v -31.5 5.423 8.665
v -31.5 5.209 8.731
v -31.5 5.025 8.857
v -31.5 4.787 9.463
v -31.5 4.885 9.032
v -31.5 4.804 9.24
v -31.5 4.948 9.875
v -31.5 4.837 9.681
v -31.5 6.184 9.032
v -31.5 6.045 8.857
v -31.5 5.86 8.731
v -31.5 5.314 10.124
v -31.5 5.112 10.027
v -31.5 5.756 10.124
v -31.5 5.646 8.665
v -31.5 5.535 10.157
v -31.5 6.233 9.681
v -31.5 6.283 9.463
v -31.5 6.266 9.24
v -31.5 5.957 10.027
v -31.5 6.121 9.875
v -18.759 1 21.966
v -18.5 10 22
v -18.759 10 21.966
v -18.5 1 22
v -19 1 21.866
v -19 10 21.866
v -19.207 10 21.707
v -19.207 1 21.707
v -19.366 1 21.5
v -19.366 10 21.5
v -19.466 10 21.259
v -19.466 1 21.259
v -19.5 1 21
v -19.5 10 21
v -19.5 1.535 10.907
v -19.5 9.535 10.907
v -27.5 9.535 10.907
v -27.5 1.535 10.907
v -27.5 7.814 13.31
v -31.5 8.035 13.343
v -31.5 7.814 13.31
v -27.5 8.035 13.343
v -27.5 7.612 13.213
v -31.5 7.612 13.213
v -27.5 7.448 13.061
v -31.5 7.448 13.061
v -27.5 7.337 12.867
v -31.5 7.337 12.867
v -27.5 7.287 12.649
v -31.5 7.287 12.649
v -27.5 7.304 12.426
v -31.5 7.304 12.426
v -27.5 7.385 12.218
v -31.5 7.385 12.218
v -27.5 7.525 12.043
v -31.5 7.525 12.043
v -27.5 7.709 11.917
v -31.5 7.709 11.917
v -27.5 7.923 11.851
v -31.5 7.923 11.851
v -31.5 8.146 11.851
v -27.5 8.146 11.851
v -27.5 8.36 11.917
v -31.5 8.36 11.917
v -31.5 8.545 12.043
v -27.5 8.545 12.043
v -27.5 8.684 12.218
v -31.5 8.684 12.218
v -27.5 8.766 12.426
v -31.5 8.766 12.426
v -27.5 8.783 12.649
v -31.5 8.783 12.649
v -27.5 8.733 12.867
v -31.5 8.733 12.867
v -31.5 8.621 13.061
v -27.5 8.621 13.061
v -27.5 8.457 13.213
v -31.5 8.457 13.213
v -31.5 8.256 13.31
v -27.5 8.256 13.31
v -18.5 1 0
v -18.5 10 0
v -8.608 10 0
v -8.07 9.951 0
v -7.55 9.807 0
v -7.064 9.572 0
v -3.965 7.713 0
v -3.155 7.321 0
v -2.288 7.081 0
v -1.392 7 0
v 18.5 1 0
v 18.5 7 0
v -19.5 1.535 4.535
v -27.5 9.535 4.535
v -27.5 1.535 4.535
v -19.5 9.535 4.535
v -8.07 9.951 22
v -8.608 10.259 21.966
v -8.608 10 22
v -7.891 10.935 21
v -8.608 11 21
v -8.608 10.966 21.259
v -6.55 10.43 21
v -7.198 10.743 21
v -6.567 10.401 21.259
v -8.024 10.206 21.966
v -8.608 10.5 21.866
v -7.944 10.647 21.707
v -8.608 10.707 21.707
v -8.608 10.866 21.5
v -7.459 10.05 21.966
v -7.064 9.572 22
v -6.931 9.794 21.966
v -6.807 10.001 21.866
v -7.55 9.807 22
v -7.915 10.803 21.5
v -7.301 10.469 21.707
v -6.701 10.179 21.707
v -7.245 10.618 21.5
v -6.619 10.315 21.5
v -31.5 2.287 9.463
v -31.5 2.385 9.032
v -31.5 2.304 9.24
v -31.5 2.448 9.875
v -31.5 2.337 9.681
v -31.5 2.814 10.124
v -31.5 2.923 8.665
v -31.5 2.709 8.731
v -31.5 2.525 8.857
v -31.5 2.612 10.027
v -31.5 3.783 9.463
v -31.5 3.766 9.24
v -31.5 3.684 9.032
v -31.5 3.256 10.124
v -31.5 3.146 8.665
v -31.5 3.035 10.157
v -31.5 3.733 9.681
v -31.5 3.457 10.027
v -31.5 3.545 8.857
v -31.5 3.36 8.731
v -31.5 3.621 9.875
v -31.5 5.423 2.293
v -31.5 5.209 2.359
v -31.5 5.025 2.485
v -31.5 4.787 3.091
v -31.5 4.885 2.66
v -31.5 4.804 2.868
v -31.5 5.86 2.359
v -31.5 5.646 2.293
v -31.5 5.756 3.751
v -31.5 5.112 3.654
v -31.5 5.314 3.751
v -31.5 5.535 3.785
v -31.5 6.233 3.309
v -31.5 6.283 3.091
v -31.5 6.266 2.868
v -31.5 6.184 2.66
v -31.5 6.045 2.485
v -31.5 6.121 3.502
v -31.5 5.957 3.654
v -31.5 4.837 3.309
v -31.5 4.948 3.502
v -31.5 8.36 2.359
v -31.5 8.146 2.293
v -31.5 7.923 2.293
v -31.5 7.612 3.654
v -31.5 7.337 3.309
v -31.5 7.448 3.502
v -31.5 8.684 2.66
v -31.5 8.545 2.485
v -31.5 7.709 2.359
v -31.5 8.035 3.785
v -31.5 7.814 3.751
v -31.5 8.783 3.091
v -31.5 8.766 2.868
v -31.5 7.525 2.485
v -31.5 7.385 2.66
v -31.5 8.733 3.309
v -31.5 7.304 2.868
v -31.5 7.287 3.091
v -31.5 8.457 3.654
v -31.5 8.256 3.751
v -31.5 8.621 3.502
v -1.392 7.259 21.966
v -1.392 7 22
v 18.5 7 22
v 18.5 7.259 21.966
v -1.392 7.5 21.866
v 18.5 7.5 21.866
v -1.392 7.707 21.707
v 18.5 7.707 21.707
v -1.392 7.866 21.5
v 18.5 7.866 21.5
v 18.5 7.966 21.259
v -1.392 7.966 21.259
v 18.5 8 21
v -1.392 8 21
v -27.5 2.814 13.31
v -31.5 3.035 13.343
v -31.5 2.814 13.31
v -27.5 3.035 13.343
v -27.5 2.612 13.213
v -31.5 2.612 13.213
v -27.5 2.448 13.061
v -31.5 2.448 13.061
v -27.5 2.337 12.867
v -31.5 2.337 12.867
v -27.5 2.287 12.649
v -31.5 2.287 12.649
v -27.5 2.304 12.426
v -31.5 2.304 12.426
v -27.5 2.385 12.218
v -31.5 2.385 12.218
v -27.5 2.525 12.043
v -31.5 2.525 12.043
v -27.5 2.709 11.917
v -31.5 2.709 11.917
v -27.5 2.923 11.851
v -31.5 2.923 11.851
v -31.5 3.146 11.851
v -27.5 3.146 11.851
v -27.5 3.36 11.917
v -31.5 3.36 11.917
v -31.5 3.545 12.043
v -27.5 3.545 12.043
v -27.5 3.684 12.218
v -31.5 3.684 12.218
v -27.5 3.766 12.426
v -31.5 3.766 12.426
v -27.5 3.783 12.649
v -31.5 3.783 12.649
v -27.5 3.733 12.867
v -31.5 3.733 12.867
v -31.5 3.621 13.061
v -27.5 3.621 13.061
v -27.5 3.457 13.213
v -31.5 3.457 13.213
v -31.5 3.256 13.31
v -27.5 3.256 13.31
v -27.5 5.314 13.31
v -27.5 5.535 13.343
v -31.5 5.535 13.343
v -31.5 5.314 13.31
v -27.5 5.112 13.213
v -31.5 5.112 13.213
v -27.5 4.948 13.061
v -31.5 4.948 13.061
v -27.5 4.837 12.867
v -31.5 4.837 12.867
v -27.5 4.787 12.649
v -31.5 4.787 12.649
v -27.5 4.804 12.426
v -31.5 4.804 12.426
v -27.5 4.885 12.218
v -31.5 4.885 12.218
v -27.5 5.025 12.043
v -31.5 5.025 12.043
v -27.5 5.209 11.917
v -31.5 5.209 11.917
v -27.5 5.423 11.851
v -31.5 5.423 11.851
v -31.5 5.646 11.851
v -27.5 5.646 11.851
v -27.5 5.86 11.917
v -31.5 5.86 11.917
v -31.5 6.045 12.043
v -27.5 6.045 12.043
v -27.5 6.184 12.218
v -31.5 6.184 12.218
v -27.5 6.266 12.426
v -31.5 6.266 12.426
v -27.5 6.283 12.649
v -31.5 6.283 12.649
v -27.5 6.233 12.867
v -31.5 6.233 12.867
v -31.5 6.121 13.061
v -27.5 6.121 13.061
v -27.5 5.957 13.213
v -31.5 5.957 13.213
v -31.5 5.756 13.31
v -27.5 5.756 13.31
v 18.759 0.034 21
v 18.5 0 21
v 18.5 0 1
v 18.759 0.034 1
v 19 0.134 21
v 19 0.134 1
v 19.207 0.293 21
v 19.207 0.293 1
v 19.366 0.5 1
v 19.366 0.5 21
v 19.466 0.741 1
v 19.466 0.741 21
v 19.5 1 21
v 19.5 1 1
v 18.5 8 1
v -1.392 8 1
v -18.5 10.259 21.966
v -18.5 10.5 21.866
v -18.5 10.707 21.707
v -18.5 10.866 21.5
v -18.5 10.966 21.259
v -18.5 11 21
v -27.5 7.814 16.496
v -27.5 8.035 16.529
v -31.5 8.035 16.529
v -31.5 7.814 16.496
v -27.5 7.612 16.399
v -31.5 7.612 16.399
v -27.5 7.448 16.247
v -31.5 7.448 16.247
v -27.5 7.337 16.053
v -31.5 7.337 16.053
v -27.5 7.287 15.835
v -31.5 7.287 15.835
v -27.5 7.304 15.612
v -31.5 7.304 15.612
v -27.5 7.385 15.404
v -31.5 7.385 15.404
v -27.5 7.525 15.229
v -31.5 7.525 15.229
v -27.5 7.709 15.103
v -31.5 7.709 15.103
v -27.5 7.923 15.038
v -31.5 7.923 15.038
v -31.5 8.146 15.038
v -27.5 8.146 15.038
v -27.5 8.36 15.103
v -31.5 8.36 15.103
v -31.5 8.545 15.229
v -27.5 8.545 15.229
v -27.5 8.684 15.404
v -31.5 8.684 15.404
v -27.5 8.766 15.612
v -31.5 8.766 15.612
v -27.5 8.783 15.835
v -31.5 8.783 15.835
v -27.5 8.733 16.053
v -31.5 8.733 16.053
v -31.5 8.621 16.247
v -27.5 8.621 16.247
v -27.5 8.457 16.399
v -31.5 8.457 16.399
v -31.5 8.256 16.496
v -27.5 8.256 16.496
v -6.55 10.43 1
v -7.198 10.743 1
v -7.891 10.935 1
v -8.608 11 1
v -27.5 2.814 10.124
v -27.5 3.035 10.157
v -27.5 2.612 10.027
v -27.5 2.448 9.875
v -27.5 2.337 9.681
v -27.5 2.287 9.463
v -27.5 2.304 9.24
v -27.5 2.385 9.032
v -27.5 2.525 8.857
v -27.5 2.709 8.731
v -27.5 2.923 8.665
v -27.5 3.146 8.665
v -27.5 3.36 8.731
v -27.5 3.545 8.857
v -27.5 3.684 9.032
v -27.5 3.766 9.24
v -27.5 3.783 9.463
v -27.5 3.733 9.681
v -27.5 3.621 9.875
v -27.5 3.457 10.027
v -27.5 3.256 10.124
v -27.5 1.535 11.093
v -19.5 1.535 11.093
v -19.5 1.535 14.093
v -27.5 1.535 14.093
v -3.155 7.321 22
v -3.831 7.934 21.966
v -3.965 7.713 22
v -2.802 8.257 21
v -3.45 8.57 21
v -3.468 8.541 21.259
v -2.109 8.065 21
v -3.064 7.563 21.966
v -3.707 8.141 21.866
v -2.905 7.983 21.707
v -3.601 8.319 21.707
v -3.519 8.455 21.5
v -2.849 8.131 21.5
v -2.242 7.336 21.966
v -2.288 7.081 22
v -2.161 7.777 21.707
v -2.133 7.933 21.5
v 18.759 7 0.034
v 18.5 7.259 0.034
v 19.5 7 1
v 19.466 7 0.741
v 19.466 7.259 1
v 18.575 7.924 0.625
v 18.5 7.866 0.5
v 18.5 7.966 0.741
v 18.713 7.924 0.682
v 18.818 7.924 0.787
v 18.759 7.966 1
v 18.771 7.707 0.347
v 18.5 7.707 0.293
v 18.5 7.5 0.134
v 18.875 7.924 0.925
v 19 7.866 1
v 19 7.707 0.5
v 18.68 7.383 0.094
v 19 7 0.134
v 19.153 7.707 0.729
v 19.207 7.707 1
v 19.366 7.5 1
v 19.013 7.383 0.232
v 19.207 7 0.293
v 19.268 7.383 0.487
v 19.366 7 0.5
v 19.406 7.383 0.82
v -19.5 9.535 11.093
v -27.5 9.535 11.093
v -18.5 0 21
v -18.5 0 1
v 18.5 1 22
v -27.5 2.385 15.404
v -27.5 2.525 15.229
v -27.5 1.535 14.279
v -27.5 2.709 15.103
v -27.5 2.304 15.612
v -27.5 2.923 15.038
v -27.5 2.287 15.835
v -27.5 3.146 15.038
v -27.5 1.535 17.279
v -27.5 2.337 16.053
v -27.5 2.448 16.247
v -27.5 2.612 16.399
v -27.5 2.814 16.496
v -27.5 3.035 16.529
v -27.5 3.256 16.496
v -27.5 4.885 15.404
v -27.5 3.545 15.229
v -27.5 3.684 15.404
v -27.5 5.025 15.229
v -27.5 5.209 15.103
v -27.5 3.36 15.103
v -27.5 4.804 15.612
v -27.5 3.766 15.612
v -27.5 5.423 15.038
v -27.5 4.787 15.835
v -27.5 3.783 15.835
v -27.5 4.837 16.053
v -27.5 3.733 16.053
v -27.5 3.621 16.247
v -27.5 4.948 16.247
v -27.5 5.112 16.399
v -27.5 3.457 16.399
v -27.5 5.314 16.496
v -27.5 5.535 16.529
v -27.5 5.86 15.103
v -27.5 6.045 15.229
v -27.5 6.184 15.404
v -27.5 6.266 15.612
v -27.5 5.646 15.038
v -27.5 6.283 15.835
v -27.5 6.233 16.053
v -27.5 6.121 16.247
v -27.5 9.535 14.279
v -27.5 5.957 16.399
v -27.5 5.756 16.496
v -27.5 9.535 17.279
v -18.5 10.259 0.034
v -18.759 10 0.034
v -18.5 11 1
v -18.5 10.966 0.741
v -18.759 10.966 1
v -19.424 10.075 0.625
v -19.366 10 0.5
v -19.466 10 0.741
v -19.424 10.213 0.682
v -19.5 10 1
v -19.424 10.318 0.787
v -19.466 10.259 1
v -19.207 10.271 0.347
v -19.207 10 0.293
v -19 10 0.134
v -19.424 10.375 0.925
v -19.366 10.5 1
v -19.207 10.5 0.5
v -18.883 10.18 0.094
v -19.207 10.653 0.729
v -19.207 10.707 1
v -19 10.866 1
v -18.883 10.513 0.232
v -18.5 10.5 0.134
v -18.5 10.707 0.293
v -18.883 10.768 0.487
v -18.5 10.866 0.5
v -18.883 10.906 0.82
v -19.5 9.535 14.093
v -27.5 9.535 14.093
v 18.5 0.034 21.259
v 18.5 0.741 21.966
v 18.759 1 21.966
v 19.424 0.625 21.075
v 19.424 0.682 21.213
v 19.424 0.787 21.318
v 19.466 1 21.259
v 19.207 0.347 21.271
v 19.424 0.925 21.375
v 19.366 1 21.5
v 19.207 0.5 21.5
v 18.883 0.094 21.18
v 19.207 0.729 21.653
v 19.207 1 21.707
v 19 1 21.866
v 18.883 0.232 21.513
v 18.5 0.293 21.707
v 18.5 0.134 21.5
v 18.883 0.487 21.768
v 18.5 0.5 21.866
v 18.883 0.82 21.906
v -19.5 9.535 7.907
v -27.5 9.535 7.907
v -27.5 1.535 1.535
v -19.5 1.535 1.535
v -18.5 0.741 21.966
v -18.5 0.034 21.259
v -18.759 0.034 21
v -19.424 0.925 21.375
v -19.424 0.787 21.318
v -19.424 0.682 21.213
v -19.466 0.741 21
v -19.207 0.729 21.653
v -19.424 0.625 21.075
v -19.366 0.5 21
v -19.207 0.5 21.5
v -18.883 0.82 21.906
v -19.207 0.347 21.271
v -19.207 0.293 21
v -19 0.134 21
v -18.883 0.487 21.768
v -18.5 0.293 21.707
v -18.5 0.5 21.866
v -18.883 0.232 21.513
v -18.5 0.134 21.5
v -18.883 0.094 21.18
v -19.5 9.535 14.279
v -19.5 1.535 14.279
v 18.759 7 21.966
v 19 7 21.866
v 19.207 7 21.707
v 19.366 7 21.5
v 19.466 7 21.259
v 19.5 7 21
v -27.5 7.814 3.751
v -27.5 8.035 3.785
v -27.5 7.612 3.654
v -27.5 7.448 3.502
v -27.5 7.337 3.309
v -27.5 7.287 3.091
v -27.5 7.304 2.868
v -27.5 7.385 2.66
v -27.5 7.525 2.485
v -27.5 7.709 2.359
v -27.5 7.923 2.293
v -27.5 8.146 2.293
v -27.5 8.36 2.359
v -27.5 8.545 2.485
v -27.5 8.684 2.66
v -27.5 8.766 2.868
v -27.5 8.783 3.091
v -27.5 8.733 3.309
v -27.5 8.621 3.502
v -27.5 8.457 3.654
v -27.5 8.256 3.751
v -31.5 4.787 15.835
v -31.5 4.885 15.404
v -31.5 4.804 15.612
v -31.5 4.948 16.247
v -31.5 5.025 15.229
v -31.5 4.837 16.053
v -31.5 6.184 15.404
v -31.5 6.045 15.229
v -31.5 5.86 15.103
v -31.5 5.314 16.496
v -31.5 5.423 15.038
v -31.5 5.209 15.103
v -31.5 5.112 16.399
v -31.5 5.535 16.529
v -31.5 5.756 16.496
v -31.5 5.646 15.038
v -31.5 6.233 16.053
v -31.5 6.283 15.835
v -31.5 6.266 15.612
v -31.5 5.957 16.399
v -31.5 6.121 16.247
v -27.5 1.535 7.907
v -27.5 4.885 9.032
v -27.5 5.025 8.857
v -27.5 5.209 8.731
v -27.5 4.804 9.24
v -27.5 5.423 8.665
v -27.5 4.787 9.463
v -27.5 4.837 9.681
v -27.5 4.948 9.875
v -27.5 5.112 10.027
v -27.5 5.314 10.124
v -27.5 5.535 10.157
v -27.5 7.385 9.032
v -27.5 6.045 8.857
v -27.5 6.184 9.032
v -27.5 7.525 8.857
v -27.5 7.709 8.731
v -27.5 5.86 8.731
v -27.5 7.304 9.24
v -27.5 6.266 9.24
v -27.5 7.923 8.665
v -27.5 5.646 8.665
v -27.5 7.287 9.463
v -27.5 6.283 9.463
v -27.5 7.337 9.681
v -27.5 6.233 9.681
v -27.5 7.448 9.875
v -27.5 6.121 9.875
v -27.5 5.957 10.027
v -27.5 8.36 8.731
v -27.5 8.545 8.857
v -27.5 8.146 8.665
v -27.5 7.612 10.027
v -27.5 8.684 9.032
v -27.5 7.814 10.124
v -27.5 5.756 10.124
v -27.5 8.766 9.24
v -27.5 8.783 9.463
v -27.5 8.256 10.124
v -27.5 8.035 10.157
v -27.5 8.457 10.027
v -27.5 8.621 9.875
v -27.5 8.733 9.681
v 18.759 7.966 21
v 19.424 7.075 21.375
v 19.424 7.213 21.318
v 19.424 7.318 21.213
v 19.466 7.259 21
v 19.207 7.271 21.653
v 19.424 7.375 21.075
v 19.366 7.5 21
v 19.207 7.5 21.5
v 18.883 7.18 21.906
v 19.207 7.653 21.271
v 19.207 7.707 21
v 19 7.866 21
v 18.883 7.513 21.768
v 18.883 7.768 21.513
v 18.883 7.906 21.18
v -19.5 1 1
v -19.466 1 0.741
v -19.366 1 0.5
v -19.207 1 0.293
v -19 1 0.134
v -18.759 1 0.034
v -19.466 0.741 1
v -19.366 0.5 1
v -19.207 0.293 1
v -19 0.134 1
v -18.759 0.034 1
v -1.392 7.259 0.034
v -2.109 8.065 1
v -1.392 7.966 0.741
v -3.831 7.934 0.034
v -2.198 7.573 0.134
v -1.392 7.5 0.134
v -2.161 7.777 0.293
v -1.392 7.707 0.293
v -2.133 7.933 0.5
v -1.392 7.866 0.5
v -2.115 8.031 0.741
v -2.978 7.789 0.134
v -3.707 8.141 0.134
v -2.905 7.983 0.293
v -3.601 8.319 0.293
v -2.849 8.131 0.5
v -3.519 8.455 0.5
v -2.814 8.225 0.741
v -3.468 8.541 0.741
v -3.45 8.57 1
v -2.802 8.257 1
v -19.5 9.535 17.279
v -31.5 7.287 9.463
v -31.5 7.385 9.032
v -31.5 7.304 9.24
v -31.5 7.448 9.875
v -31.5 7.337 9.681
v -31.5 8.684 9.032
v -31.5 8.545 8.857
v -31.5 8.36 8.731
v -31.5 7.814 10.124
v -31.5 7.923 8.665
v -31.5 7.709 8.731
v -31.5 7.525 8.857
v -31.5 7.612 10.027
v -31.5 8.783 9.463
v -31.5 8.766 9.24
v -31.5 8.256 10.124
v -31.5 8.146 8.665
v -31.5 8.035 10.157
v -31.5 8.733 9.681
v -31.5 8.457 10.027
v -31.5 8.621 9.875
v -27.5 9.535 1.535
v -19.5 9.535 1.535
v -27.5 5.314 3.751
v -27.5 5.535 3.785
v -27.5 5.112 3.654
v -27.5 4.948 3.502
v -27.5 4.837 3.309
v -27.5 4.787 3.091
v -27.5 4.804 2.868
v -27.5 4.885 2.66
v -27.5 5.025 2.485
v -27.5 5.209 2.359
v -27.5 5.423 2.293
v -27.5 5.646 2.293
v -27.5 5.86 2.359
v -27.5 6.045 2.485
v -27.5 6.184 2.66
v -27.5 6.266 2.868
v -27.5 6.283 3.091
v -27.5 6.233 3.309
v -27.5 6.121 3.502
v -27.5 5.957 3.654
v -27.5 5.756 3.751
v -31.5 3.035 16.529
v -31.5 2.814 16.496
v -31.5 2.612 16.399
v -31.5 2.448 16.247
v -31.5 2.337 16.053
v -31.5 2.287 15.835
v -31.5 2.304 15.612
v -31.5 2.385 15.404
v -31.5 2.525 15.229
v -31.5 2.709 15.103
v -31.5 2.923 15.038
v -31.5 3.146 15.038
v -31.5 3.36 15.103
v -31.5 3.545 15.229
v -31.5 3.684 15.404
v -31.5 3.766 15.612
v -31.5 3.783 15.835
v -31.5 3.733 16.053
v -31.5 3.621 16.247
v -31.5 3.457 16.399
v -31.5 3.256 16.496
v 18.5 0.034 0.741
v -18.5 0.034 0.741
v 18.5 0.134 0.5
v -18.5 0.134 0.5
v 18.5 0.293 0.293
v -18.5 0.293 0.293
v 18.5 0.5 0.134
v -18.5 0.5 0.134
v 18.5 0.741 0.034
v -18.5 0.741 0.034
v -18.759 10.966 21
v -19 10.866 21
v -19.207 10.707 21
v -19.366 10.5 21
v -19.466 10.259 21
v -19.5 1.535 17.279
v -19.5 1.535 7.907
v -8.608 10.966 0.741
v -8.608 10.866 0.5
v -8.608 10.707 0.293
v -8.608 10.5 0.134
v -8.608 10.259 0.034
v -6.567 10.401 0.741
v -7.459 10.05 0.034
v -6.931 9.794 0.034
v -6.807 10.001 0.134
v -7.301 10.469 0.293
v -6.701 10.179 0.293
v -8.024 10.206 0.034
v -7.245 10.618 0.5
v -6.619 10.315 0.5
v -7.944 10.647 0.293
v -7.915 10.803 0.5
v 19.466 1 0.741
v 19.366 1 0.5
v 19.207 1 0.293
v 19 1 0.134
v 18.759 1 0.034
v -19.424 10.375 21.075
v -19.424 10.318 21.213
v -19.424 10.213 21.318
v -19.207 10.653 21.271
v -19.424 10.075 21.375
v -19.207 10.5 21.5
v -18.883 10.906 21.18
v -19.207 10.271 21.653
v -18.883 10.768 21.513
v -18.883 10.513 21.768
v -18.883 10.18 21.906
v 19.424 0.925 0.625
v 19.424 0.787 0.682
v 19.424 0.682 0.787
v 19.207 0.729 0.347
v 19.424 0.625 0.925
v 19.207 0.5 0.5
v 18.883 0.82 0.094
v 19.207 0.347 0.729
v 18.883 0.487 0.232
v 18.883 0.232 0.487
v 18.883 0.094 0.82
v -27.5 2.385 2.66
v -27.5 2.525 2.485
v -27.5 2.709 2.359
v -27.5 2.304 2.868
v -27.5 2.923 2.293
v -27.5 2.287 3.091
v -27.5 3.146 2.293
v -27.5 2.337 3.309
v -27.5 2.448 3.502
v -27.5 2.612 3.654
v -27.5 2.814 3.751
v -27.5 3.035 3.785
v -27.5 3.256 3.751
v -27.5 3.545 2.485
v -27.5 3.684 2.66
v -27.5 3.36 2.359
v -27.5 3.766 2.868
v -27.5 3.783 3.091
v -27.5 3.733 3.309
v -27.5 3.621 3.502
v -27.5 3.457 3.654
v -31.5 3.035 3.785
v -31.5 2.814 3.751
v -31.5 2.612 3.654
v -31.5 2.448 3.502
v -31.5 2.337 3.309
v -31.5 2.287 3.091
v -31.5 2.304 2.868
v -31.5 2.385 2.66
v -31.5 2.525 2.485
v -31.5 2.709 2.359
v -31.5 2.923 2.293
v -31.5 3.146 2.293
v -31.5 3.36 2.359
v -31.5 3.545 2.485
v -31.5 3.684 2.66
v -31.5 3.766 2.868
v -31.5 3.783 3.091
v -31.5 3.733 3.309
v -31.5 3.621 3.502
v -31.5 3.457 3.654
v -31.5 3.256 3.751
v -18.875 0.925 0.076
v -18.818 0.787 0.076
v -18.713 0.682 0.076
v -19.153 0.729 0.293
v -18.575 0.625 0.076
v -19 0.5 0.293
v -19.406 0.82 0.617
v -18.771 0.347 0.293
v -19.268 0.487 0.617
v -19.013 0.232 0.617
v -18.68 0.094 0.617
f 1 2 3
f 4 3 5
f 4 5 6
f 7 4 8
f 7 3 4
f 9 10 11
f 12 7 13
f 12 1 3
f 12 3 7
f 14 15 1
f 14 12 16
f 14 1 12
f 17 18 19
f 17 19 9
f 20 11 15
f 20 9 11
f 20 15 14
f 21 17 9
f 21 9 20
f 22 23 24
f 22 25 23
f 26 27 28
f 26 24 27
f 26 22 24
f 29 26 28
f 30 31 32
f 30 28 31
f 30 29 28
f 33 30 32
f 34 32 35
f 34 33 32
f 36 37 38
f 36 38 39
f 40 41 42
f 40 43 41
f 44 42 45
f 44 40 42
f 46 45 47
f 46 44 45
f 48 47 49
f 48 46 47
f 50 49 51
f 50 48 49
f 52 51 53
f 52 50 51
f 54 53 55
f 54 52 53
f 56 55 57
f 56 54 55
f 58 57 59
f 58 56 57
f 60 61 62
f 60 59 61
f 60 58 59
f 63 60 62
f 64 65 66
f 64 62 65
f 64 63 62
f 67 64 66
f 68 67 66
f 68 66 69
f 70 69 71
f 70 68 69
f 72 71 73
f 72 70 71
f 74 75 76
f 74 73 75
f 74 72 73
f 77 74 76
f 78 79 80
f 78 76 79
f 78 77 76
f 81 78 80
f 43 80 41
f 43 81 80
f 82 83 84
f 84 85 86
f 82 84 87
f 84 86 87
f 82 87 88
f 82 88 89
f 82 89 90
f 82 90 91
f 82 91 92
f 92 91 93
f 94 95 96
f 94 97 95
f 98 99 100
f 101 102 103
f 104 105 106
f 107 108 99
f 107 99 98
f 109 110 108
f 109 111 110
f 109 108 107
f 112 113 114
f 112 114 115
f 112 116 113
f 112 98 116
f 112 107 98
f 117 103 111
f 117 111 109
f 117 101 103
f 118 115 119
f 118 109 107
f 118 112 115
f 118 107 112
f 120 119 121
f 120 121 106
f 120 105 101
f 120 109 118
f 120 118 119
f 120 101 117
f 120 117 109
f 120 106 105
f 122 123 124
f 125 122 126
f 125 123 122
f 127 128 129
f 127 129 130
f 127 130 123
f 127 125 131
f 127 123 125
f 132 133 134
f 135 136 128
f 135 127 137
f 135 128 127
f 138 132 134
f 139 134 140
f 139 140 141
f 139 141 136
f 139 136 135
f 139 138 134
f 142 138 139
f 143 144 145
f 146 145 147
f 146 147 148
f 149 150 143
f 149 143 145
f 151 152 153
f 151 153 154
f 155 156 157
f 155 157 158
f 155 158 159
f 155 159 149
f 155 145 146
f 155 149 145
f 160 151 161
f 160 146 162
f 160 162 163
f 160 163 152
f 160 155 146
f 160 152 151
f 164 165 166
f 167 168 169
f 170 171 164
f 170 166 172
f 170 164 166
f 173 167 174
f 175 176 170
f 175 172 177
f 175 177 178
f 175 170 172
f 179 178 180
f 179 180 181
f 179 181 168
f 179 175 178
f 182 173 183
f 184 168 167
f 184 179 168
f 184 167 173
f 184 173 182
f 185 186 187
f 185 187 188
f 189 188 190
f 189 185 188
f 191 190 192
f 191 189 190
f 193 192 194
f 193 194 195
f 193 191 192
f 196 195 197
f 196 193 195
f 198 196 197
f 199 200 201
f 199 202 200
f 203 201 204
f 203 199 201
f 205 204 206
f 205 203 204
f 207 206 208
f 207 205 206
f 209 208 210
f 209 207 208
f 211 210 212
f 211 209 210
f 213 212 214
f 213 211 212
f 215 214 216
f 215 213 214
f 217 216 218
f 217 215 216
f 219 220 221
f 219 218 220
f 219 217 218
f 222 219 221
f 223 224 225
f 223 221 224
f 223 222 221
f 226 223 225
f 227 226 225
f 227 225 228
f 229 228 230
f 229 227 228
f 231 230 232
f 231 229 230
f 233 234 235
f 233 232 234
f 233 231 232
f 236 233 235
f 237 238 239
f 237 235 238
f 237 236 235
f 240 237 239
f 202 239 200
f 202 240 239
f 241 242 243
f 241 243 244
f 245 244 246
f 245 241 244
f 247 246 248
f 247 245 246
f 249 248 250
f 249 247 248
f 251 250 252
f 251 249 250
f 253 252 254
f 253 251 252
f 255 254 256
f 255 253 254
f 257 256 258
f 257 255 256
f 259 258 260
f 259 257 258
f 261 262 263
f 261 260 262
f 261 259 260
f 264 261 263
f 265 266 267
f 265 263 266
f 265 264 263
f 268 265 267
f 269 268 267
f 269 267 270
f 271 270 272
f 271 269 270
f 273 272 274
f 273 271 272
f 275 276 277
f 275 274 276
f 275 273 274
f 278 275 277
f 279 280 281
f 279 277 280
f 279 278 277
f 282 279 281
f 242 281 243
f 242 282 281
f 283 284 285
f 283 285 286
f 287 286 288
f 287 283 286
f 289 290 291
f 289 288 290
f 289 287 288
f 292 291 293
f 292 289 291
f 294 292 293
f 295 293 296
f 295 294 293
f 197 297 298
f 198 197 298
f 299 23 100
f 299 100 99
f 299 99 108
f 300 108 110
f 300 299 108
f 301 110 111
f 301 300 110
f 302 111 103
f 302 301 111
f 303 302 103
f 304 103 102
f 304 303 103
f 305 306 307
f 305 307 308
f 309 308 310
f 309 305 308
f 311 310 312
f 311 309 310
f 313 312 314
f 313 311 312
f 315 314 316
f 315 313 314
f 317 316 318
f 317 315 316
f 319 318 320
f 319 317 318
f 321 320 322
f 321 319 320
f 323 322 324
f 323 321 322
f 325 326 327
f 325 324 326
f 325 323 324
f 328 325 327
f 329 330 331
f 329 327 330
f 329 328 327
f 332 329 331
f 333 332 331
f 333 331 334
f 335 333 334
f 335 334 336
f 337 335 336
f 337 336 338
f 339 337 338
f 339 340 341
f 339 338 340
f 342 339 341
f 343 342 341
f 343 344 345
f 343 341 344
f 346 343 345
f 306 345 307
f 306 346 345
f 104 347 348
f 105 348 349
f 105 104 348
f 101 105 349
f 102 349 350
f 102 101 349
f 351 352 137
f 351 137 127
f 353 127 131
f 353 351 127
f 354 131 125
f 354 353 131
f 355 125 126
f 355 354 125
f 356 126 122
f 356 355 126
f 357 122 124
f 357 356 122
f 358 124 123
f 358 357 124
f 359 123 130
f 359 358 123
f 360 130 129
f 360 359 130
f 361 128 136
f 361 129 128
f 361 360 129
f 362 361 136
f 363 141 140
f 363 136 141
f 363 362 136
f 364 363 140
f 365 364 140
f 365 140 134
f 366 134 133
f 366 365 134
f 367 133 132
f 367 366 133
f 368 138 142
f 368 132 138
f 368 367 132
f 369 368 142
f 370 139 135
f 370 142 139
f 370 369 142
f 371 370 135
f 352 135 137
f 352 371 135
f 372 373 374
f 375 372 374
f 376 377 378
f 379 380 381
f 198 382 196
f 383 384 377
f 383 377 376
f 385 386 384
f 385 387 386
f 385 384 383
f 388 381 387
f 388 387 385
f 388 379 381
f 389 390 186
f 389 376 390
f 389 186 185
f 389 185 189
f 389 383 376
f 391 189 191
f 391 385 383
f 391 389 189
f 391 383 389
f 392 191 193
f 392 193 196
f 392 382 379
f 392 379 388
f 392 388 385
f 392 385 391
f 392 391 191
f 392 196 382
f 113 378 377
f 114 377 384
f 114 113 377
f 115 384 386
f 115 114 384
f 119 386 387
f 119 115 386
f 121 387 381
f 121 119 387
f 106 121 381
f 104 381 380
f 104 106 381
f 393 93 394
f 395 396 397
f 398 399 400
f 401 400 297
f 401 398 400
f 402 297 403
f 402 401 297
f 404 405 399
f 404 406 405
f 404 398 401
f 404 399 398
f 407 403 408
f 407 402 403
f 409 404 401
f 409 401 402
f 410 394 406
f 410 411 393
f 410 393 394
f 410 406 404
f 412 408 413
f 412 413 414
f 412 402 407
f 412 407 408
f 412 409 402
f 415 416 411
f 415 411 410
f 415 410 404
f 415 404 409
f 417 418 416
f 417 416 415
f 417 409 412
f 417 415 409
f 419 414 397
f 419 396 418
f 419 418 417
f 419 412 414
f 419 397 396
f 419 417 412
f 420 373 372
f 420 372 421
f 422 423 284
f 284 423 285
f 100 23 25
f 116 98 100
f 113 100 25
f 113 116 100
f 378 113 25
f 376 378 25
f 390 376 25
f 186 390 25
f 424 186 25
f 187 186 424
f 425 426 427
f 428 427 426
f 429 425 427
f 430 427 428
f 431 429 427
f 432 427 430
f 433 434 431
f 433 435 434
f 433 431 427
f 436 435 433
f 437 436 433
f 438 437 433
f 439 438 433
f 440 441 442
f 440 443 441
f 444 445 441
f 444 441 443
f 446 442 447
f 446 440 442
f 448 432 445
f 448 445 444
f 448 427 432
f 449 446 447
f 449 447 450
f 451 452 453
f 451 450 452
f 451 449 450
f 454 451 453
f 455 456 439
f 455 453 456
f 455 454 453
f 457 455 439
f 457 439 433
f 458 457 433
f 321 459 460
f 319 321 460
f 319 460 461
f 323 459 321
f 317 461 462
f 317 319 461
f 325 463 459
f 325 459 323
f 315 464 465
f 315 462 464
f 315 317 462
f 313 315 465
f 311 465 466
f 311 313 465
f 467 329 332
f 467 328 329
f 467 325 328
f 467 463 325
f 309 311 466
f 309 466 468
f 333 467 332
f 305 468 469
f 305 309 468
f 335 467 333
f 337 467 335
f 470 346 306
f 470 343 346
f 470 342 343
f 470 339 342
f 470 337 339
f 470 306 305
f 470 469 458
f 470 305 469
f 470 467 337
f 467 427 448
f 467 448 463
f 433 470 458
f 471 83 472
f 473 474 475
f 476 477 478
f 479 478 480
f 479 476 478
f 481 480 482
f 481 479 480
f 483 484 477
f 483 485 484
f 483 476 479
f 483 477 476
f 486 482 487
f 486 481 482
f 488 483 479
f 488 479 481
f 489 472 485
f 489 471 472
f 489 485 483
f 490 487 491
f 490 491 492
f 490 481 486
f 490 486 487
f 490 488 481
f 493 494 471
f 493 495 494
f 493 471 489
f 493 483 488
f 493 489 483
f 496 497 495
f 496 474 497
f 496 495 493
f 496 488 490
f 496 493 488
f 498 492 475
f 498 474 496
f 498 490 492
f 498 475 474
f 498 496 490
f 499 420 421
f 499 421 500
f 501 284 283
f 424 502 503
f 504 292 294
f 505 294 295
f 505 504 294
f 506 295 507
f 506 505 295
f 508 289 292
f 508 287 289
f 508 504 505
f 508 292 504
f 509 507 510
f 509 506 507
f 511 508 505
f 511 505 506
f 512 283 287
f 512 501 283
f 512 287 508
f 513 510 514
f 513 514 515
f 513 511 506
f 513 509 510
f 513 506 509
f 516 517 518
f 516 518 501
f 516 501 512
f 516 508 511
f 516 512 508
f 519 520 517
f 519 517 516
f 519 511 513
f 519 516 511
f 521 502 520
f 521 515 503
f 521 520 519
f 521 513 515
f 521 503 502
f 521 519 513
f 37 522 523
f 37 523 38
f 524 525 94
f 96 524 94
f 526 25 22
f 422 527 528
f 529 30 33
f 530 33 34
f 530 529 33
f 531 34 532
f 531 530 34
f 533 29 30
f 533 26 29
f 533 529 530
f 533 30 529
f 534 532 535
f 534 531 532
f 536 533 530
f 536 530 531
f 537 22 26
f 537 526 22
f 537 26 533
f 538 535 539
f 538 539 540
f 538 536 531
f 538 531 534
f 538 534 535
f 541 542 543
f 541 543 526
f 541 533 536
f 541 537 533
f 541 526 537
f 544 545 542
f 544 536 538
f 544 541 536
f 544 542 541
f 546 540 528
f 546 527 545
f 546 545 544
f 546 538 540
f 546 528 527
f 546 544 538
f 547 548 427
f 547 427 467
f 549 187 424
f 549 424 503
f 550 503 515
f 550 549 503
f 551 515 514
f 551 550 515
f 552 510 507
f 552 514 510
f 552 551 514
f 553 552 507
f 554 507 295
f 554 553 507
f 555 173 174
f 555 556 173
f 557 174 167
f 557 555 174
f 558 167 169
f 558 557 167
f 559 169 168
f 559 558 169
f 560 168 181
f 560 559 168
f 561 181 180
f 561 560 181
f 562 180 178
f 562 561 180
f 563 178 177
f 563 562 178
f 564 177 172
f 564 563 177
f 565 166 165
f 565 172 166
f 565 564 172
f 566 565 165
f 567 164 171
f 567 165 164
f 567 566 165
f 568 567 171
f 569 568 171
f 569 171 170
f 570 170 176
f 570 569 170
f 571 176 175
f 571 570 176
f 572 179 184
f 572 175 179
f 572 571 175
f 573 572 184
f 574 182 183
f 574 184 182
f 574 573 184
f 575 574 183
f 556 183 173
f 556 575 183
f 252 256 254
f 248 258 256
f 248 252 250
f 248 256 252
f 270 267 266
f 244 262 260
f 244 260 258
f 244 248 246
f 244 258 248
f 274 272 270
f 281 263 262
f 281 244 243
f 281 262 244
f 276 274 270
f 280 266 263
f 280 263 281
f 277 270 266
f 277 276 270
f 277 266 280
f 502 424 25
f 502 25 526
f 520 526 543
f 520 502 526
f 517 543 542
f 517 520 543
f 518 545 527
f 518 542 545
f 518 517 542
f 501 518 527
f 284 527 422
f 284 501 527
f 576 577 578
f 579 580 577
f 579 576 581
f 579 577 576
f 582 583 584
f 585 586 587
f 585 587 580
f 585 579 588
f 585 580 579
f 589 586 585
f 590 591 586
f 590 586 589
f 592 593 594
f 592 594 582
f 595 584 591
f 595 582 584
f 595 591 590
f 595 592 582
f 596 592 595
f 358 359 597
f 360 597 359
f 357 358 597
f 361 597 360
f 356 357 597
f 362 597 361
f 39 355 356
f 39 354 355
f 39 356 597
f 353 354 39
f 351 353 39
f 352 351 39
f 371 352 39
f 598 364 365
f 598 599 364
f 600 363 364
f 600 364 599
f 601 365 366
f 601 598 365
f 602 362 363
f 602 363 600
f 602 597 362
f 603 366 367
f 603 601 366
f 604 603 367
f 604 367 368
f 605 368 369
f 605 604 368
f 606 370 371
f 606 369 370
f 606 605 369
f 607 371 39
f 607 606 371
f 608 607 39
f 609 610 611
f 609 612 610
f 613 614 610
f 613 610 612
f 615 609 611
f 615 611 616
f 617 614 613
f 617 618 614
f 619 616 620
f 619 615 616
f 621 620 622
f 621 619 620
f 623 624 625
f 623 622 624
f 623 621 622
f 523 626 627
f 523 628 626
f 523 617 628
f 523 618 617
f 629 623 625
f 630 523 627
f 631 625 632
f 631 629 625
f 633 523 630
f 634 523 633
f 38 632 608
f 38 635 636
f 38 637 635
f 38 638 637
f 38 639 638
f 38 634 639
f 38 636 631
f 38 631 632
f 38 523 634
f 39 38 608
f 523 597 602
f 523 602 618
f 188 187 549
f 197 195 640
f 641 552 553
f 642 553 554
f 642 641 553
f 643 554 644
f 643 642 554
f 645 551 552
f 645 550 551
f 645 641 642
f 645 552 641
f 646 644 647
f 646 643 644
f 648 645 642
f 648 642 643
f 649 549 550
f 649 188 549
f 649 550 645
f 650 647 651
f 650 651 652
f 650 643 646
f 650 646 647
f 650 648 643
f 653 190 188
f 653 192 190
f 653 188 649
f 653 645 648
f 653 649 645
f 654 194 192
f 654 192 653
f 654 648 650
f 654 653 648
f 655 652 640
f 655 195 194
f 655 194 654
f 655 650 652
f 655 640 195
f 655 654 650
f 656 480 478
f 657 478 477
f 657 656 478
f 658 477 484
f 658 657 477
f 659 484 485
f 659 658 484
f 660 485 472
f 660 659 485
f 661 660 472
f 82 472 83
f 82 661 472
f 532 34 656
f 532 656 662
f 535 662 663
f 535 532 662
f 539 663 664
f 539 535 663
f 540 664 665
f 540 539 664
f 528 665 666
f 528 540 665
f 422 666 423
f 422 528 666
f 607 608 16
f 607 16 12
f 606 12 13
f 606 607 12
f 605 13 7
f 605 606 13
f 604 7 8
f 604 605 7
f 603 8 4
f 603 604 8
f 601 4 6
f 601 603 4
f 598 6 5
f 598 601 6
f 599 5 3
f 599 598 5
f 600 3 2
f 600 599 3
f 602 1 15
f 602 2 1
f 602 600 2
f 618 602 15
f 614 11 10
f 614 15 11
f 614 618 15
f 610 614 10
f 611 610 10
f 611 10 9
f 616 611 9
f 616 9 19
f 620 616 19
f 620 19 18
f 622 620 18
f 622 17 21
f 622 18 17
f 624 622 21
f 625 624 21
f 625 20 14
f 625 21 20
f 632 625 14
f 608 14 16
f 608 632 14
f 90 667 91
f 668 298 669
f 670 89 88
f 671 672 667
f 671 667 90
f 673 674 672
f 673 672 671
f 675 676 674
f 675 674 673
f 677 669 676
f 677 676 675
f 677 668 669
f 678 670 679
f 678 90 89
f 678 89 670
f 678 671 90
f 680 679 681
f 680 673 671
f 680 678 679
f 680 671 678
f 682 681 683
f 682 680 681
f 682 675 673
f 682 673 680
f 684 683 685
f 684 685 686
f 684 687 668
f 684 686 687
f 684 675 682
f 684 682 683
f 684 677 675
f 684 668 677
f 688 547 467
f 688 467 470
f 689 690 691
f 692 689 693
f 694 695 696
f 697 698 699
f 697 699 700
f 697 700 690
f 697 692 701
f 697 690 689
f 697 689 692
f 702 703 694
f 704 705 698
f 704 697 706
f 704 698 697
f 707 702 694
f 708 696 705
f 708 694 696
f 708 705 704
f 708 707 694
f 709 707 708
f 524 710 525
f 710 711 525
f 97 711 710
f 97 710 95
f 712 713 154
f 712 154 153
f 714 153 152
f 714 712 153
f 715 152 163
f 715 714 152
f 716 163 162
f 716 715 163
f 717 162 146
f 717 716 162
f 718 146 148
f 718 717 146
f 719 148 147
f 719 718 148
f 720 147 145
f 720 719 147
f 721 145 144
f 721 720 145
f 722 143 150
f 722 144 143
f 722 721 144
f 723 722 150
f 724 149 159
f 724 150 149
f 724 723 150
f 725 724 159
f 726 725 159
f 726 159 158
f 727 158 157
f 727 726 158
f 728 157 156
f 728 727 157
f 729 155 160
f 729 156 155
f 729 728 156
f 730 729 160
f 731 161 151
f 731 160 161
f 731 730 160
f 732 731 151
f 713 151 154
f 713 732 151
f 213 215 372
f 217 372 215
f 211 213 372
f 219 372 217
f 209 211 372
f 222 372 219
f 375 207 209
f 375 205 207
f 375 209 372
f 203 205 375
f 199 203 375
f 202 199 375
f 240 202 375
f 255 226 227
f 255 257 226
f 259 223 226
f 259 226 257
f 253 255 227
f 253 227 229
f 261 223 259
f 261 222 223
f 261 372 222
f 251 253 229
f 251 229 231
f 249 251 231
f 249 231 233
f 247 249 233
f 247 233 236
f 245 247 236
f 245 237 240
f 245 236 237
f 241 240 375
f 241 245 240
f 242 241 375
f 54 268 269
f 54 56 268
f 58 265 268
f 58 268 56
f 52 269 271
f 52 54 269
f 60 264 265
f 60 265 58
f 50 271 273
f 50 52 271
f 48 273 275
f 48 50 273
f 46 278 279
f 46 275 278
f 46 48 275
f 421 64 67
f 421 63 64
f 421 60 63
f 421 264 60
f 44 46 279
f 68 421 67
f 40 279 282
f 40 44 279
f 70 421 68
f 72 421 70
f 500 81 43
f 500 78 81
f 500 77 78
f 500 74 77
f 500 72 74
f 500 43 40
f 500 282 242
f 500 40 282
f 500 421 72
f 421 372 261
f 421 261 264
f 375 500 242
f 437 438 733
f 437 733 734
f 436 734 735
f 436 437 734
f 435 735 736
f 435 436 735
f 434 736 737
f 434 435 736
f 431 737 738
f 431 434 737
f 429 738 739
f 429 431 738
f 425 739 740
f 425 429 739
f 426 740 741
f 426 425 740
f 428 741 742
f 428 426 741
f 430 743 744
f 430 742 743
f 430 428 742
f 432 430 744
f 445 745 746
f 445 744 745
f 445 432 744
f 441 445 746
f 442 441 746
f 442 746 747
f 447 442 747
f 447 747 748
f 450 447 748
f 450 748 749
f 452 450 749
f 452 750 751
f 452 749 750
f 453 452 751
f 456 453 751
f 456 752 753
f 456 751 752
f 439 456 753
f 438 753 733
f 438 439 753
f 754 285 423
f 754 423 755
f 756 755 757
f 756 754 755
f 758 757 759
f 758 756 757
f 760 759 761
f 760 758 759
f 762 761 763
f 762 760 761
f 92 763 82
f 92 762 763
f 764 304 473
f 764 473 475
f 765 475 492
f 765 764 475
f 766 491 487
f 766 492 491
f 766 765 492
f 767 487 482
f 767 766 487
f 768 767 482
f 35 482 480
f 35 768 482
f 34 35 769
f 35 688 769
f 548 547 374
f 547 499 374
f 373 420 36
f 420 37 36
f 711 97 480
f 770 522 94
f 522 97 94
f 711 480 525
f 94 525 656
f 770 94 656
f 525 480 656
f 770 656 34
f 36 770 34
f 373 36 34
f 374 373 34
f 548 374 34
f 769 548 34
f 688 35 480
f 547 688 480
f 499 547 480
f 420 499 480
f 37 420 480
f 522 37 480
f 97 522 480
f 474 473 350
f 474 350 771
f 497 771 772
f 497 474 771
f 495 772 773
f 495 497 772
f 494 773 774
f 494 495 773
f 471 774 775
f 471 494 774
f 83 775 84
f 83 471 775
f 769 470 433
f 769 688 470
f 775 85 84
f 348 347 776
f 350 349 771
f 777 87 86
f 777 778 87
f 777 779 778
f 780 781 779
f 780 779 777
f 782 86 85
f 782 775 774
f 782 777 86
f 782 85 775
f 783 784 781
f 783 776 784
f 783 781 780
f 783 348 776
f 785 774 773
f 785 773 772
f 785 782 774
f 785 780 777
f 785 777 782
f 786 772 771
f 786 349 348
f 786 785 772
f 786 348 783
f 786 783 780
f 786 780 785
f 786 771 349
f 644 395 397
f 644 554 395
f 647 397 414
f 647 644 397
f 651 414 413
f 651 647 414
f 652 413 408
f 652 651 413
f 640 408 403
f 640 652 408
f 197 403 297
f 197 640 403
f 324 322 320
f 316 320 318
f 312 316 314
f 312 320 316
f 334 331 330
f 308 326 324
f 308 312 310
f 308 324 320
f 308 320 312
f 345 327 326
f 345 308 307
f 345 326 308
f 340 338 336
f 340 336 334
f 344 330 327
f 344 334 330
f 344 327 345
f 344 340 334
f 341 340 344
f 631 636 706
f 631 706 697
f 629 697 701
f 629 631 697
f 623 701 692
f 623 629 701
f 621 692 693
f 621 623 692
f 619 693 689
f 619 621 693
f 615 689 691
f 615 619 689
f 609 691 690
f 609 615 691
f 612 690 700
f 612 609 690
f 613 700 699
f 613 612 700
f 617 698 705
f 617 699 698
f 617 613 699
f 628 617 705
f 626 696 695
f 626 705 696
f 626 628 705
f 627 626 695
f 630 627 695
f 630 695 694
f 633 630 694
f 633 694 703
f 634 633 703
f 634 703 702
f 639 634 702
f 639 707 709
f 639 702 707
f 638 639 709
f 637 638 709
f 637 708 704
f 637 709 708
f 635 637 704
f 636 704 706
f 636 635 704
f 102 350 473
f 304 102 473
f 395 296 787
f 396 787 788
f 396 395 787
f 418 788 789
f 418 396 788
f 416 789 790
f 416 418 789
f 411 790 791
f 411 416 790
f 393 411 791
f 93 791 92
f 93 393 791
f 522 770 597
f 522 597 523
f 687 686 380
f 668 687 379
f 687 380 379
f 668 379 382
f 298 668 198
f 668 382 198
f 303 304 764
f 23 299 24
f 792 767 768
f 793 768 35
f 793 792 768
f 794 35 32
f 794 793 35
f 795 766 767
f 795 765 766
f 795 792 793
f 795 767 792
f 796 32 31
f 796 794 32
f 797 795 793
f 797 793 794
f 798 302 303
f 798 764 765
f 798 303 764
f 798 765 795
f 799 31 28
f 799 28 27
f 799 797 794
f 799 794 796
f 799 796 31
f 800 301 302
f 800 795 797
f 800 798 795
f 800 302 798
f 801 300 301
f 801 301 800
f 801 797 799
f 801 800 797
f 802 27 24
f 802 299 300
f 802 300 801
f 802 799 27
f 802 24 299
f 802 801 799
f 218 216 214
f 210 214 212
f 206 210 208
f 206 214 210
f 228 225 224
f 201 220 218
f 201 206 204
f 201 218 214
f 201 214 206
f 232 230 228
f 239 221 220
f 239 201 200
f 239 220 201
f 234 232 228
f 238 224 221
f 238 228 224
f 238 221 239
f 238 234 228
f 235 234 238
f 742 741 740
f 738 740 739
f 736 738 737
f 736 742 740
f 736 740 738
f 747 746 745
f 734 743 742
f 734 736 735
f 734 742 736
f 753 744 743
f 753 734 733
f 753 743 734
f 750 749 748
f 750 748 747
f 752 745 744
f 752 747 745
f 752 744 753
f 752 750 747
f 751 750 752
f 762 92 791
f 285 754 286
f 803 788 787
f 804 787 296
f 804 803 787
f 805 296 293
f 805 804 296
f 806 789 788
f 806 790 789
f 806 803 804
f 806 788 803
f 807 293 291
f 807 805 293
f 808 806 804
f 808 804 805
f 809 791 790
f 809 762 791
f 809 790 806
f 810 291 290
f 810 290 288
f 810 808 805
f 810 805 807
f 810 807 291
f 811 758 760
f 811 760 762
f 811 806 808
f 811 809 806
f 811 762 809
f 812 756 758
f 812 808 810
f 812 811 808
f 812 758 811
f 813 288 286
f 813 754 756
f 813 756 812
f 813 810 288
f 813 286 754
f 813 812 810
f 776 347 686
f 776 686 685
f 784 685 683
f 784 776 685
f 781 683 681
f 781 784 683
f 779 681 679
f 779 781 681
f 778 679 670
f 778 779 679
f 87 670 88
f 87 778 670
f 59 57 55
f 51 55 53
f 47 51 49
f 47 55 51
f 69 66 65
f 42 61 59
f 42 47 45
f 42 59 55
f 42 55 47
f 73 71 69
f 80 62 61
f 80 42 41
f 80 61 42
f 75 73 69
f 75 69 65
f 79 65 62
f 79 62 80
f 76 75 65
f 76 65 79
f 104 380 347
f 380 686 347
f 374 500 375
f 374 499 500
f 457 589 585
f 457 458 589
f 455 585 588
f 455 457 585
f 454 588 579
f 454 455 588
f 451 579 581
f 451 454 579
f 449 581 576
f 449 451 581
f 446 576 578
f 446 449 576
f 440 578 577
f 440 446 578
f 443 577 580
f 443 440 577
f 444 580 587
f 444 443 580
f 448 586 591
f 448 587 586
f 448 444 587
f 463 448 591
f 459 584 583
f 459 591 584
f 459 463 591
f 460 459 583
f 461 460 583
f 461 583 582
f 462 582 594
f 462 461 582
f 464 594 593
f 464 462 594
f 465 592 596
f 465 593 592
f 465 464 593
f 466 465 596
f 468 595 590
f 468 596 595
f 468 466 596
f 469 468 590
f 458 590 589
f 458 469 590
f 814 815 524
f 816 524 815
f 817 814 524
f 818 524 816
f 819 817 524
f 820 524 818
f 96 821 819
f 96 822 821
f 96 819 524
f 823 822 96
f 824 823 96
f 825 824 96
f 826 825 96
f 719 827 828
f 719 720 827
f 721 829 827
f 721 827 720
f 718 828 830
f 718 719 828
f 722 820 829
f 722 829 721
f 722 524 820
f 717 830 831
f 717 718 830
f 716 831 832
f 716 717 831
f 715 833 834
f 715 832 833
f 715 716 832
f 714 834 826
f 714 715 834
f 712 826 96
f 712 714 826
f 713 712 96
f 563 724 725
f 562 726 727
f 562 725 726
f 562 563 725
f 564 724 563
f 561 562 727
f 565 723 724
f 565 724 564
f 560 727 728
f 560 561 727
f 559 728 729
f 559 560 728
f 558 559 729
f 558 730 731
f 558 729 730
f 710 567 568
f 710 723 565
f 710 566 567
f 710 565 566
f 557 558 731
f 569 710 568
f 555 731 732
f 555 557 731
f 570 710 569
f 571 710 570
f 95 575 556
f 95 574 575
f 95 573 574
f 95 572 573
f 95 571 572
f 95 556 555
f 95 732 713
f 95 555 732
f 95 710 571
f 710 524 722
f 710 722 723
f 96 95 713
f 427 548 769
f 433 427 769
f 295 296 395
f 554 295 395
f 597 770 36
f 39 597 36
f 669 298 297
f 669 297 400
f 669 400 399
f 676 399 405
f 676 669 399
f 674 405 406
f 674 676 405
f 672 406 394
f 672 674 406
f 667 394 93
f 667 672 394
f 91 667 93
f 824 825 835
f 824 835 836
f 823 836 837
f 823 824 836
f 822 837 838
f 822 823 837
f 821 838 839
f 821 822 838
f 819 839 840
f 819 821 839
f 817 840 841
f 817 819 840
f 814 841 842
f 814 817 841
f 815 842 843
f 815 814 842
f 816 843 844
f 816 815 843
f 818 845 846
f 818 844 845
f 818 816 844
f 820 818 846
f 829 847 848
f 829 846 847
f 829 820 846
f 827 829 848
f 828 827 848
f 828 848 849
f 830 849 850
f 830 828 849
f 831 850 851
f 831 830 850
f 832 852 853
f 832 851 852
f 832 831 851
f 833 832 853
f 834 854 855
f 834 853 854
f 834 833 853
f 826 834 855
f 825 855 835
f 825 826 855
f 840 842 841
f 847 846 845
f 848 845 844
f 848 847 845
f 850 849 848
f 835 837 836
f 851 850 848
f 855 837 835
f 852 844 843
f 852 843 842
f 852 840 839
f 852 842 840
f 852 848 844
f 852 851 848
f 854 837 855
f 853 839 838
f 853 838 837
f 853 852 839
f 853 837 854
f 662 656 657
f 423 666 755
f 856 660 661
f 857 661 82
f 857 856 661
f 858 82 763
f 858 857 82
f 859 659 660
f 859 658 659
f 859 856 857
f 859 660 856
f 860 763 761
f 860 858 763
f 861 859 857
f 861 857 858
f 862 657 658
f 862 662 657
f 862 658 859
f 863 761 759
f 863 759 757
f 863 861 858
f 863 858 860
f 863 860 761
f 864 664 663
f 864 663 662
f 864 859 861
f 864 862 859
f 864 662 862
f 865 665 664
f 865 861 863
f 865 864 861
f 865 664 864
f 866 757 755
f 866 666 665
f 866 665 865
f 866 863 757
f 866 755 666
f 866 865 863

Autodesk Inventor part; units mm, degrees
ref_plane "YZ Plane" through (0, 0, 0) normal (1, 0, 0) x (0, 1, 0)
ref_plane "XZ Plane" through (0, 0, 0) normal (0, 1, 0) x (-1, 0, 0)
ref_plane "XY Plane" through (0, 0, 0) normal (0, 0, 1) x (1, 0, 0)
sketch "スケッチ1" plane through (0, 0, 0) normal (0, 0, 1) x (1, 0, 0)
  line L0 (-19.5, 11) -> (-19.5, 0)
  line L1 (-19.5, 0) -> (19.5, 0)
  line L2 (19.5, 0) -> (19.5, 8)
  line L3 (19.5, 8) -> (-2.5, 8)
  line L4 (-2.5, 8) -> (-7.5, 11)
  line L5 (-7.5, 11) -> (-19.5, 11)
  point P0 (0, 0)
  point P1 (0, 0)
  dimension "d0" = 8
  dimension "d1" = 11
  dimension "d2" = 39
  dimension "d3" = 12
  dimension "d4" = 22
extrude "押し出し1" add sketch "スケッチ1" along normal blind 22
fillet "フィレット1" radius 1 16 edges at (0, 0, 22) (8.5, 8, 22) (19.5, 4, 22) (-19.5, 0, 11) (0, 0, 0) (19.5, 0, 11) (19.5, 4, 0) (19.5, 8, 11) (-5, 9.5, 22) (8.5, 8, 0) (-5, 9.5, 0) (-13.5, 11, 22) (-19.5, 5.5, 22) (-13.5, 11, 0) (-19.5, 5.5, 0) (-19.5, 11, 11)
fillet "フィレット1" radius 4 2 edges at (-7.5, 11, 11) (-2.5, 8, 11)
sketch "スケッチ2" plane through (-19.5, 1, 1) normal (-1, 0, 0) x (0, 0, 1)
  line L0 (0, 0) -> (0, 9) projected
  line L1 (20, 0) -> (0, 0) projected
  line L2 (20, 9) -> (20, 0) projected
  line L3 (0.5347, 8.5347) -> (0.5347, 0.5347)
  line L4 (0.5347, 0.5347) -> (19.4653, 0.5347)
  line L5 (19.4653, 0.5347) -> (19.4653, 8.5)
  line L6 (0.5347, 8.5347) -> (3.5347, 8.5347)
  line L7 (3.5347, 8.5347) -> (3.5347, 0.5347)
  line L8 (3.5347, 0.5347) -> (0.5347, 0.5347)
  line L9 (0.5347, 0.5347) -> (0.5347, 8.5347)
  line L10 (3.7208, 8.5347) -> (6.7208, 8.5347)
  line L11 (6.7208, 8.5347) -> (6.7208, 0.5347)
  line L12 (6.7208, 0.5347) -> (3.7208, 0.5347)
  line L13 (3.7208, 0.5347) -> (3.7208, 8.5347)
  line L14 (6.9069, 8.5347) -> (9.9069, 8.5347)
  line L15 (9.9069, 8.5347) -> (9.9069, 0.5347)
  line L16 (9.9069, 0.5347) -> (6.9069, 0.5347)
  line L17 (6.9069, 0.5347) -> (6.9069, 8.5347)
  line L18 (10.0931, 8.5347) -> (13.0931, 8.5347)
  line L19 (13.0931, 8.5347) -> (13.0931, 0.5347)
  line L20 (13.0931, 0.5347) -> (10.0931, 0.5347)
  line L21 (10.0931, 0.5347) -> (10.0931, 8.5347)
  line L22 (13.2792, 8.5347) -> (16.2792, 8.5347)
  line L23 (16.2792, 8.5347) -> (16.2792, 0.5347)
  line L24 (16.2792, 0.5347) -> (13.2792, 0.5347)
  line L25 (13.2792, 0.5347) -> (13.2792, 8.5347)
  line L26 (16.4653, 8.5347) -> (19.4653, 8.5347)
  line L27 (19.4653, 8.5347) -> (19.4653, 0.5347)
  line L28 (19.4653, 0.5347) -> (16.4653, 0.5347)
  line L29 (16.4653, 0.5347) -> (16.4653, 8.5347)
  line L30 (3.5347, 8.5347) -> (3.7208, 8.5347)
  line L31 (6.7208, 8.5347) -> (6.9069, 8.5347)
  line L32 (9.9069, 8.5347) -> (10.0931, 8.5347)
  line L33 (13.0931, 8.5347) -> (13.2792, 8.5347)
  line L34 (16.2792, 8.5347) -> (16.4653, 8.5347)
  point P0 (-1, -1)
  dimension "d9" = 8
  dimension "d11" = 0.5347
  dimension "d12" = 3
extrude "押し出し2" add sketch "スケッチ2" along normal blind 8 contours L6 L7 L4 L3 | L10 L11 L4 L13 | L14 L15 L4 L17 | L18 L19 L4 L21 | L22 L23 L4 L25 | L26 L27 L5 L4 L29
sketch "スケッチ4" plane through (-27.5, 1, 1) normal (-1, 0, 0) x (0, 0, 1)
  line L0 (0.5347, 8.5347) -> (0.5347, 0.5347) projected
  line L1 (6.7208, 0.5347) -> (6.7208, 8.5347) projected
  line L2 (6.7208, 8.5347) -> (3.7208, 8.5347) projected
  line L3 (3.7208, 8.5347) -> (3.7208, 0.5347) projected
  line L4 (3.7208, 0.5347) -> (6.7208, 0.5347) projected
  line L5 (9.9069, 0.5347) -> (9.9069, 8.5347) projected
  line L6 (9.9069, 8.5347) -> (6.9069, 8.5347) projected
  line L7 (6.9069, 8.5347) -> (6.9069, 0.5347) projected
  line L8 (6.9069, 0.5347) -> (9.9069, 0.5347) projected
  line L9 (13.0931, 0.5347) -> (13.0931, 8.5347) projected
  line L10 (13.0931, 8.5347) -> (10.0931, 8.5347) projected
  line L11 (10.0931, 8.5347) -> (10.0931, 0.5347) projected
  line L12 (10.0931, 0.5347) -> (13.0931, 0.5347) projected
  line L13 (16.2792, 0.5347) -> (16.2792, 8.5347) projected
  line L14 (16.2792, 8.5347) -> (13.2792, 8.5347) projected
  line L15 (13.2792, 8.5347) -> (13.2792, 0.5347) projected
  line L16 (13.2792, 0.5347) -> (16.2792, 0.5347) projected
  line L17 (19.4653, 0.5347) -> (19.4653, 8.5347) projected
  line L18 (19.4653, 8.5347) -> (16.4653, 8.5347) projected
  line L19 (16.4653, 8.5347) -> (16.4653, 0.5347) projected
  line L20 (16.4653, 0.5347) -> (19.4653, 0.5347) projected
  line L21 (1.0347, 3.5347) -> (1.0347, 5.5347)
  line L22 (1.0347, 1.0347) -> (1.0347, 3.0347)
  line L23 (1.0347, 7.3573) -> (0.5347, 7.3573)
  line L24 (1.3567, 6.0347) -> (1.3567, 5.5347)
  line L25 (1.3567, 3.5347) -> (1.3567, 3.0347)
  circle A0 centre (2.0347, 2.0347) radius 0.75
  circle A1 centre (2.0347, 4.5347) radius 0.75
  circle A2 centre (2.0347, 7.0347) radius 0.75
  circle A3 centre (5.2208, 7.0347) radius 0.75
  circle A4 centre (5.2208, 4.5347) radius 0.75
  circle A5 centre (5.2208, 2.0347) radius 0.75
  circle A6 centre (8.4069, 7.0347) radius 0.75
  circle A7 centre (8.4069, 4.5347) radius 0.75
  circle A8 centre (8.4069, 2.0347) radius 0.75
  circle A9 centre (11.5931, 2.0347) radius 0.75
  circle A10 centre (11.5931, 4.5347) radius 0.75
  circle A11 centre (11.5931, 7.0347) radius 0.75
  circle A12 centre (14.7792, 7.0347) radius 0.75
  circle A13 centre (14.7792, 4.5347) radius 0.75
  circle A14 centre (14.7792, 2.0347) radius 0.75
  circle A15 centre (17.9653, 2.0347) radius 0.75
  circle A16 centre (17.9653, 4.5347) radius 0.75
  circle A17 centre (17.9653, 7.0347) radius 0.75
  point P0 (-1, -1)
  dimension "d17" = 1.5
extrude "押し出し3" add sketch "スケッチ4" along normal blind 4 contours A0 | A1 | A2 | A3 | A4 | A5 | A6 | A7 | A8 | A9 | A10 | A11 | A12 | A13 | A14 | A15 | A16 | A17
sketch "スケッチ5" plane through (-31.5, 3.0347, 6.2208) normal (-1, 0, 0) x (0, 0, 1)
  line L0 (14.2445, 6.5) -> (14.2445, -1.5) projected
  circle A0 centre (12.7445, 2.5) radius 0.75 projected
  circle A1 centre (12.7445, 0) radius 0.75 projected
  circle A2 centre (12.7445, 5) radius 0.75 projected
  line L1 (14.2445, -1.5) -> (14.2445, 6.5) projected
  line L2 (14.2445, 6.5) -> (11.2445, 6.5) projected
  line L3 (11.2445, 6.5) -> (11.2445, -1.5) projected
  line L4 (11.2445, -1.5) -> (14.2445, -1.5) projected
  circle A3 centre (0, 2.5) radius 0.75 projected
  circle A4 centre (0, 5) radius 0.75 projected
  circle A5 centre (0, 0) radius 0.75 projected
  line L5 (1.5, -1.5) -> (1.5, 6.5) projected
  line L6 (1.5, 6.5) -> (-1.5, 6.5) projected
  line L7 (-1.5, 6.5) -> (-1.5, -1.5) projected
  line L8 (-1.5, -1.5) -> (1.5, -1.5) projected
  point P0 (-6.2208, -3.0347)
extrude "押し出し4" cut sketch "スケッチ5" against normal blind 12 contours L0 L4 L3 L2 | A0 | A1 | A2 | A3 | A4 | A5 | L8 L7 L6 L5
properties part number "受信機"
